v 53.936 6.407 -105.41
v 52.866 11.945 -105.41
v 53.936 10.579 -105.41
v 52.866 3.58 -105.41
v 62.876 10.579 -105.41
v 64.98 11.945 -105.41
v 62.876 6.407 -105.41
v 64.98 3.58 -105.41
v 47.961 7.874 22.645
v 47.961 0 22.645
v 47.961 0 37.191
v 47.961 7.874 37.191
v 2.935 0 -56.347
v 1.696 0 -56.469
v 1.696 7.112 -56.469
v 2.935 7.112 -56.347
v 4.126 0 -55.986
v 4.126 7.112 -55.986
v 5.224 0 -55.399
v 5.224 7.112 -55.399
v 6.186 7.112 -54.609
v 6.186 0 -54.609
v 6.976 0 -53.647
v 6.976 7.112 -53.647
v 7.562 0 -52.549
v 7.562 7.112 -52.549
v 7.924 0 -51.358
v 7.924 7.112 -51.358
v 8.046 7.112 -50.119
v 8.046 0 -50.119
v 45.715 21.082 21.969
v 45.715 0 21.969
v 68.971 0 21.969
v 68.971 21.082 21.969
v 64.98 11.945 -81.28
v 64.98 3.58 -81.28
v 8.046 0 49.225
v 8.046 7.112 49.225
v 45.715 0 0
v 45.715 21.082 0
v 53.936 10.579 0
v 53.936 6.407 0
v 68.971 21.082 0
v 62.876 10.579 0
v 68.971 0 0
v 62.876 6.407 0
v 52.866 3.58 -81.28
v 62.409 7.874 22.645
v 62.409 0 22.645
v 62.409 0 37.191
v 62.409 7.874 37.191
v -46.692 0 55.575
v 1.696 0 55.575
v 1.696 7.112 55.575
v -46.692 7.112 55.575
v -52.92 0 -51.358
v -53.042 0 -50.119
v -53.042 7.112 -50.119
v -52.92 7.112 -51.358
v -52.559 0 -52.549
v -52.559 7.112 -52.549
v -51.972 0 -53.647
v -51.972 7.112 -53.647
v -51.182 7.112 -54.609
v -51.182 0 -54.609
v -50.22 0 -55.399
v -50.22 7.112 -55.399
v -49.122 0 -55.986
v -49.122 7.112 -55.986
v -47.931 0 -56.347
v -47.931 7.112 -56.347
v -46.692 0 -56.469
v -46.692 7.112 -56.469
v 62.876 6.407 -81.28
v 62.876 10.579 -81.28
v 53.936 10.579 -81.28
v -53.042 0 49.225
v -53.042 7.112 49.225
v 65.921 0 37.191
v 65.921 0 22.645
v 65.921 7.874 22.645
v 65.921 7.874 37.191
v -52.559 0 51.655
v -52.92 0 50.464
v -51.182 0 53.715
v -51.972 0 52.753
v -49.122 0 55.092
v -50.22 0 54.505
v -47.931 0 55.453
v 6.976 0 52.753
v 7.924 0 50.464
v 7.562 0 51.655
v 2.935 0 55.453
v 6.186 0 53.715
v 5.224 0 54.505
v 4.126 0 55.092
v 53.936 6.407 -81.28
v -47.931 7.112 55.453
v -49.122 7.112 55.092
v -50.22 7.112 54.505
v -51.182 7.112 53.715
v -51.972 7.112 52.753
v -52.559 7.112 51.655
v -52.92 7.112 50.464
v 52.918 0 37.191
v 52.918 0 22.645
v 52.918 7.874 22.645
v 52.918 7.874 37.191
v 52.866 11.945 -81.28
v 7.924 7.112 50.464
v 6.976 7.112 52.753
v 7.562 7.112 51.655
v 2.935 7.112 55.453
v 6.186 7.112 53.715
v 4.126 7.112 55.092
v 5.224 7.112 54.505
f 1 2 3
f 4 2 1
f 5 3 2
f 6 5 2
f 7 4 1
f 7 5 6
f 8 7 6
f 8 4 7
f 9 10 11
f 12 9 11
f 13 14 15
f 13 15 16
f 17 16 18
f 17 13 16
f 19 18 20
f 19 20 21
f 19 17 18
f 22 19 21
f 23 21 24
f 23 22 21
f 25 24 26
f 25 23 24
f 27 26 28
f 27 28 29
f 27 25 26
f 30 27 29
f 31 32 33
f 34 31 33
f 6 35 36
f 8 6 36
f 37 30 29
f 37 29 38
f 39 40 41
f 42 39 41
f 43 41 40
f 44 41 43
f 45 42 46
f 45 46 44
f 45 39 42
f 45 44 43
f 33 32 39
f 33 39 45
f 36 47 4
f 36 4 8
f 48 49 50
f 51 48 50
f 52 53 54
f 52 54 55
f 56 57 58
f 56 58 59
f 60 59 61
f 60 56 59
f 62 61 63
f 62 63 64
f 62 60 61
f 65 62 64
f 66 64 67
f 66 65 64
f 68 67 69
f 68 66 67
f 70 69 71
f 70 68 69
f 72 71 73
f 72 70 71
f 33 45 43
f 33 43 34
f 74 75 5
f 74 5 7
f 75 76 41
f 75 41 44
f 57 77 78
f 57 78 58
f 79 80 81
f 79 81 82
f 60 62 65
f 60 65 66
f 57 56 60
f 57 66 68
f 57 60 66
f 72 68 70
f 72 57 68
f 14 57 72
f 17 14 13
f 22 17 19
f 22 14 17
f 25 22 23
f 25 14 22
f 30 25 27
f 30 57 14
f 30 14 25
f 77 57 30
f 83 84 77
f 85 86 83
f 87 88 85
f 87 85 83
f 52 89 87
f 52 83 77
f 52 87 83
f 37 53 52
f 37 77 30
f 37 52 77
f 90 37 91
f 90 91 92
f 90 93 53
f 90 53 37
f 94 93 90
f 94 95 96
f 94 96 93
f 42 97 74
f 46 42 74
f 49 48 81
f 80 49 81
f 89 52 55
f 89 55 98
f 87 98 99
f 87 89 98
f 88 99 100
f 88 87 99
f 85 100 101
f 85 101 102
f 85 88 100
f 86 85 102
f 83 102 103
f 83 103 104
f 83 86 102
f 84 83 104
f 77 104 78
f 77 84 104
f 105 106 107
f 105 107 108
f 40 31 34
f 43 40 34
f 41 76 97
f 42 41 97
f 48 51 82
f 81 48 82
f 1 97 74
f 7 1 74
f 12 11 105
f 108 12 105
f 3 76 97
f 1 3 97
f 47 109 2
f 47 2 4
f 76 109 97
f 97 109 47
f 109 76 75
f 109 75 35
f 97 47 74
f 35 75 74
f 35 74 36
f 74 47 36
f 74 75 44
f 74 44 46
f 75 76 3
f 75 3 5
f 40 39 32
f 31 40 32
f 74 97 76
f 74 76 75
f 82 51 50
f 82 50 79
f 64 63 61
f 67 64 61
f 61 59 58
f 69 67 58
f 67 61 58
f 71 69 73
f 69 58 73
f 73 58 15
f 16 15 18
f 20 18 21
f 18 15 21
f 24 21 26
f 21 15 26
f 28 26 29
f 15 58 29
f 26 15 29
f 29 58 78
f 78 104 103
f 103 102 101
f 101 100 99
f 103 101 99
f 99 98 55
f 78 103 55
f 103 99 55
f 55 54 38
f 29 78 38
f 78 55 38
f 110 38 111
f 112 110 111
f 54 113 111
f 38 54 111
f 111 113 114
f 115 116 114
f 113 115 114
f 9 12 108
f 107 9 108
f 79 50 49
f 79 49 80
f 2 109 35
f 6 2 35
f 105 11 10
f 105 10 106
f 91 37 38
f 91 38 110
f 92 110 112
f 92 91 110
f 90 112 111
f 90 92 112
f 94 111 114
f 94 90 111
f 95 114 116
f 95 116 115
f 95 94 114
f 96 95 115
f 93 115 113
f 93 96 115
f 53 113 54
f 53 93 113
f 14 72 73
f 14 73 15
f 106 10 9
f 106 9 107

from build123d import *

# Parameters (mm, degrees)
F1_DEPTH  = 7.112
F4_W      = 23.2562273741
F4_H      = 21.9687595963
F5_DEPTH  = 21.082
F7_W      = 4.9568153918
F7_H      = 14.5456399769
F8_DEPTH  = 7.874
F7_W_2    = 3.5126581788
F9_W      = 8.9396610856
F9_H      = 4.1718445718
F10_DEPTH = 81.28
F12_W     = 12.1138878167
F12_H     = 8.3642441314
F12_W_2   = 8.9396610856
F12_H_2   = 4.1718445718
F13_DEPTH = 24.13


with BuildPart() as f1:
    # F0 (on Front) → F1 (new body)
    with BuildSketch(Plane.XZ):
        with BuildLine():
            ThreePointArc((-46.6920131981, 55.5749163032), (-51.1821412587, 53.7150443637), (-53.0420131981, 49.2249163032))
            Line((-53.0420131981, 49.2249163032), (-53.0420131981, -50.118885392))
            ThreePointArc((-53.0420131981, -50.118885392), (-51.1821412587, -54.6090134525), (-46.6920131981, -56.468885392))
            Line((-46.6920131981, -56.468885392), (1.6956985161, -56.468885392))
            ThreePointArc((1.6956985161, -56.468885392), (6.1858265766, -54.6090134525), (8.0456985161, -50.118885392))
            Line((8.0456985161, -50.118885392), (8.0456985161, 49.2249163032))
            ThreePointArc((8.0456985161, 49.2249163032), (6.1858265766, 53.7150443637), (1.6956985161, 55.5749163032))
            Line((1.6956985161, 55.5749163032), (-46.6920131981, 55.5749163032))
        make_face()
        with BuildLine():
            ThreePointArc((-50.0621236861, 39.0932964325), (-48.2022517466, 43.583424493), (-43.7121236861, 45.4432964325))
            Line((-43.7121236861, 45.4432964325), (-2.476143029, 45.4432964325))
            ThreePointArc((-2.476143029, 45.4432964325), (2.0139850316, 43.583424493), (3.873856971, 39.0932964325))
            Line((3.873856971, 39.0932964325), (3.873856971, -39.9872655213))
            ThreePointArc((3.873856971, -39.9872655213), (2.0139850316, -44.4773935818), (-2.476143029, -46.3372655213))
            Line((-2.476143029, -46.3372655213), (-43.7121236861, -46.3372655213))
            ThreePointArc((-43.7121236861, -46.3372655213), (-48.2022517466, -44.4773935818), (-50.0621236861, -39.9872655213))
            Line((-50.0621236861, -39.9872655213), (-50.0621236861, 39.0932964325))
        make_face(mode=Mode.SUBTRACT)
        with BuildLine():
            Line((-2.476143029, 45.4432964325), (-43.7121236861, 45.4432964325))
            ThreePointArc((-43.7121236861, 45.4432964325), (-48.2022517466, 43.583424493), (-50.0621236861, 39.0932964325))
            Line((-50.0621236861, 39.0932964325), (-50.0621236861, -39.9872655213))
            ThreePointArc((-50.0621236861, -39.9872655213), (-48.2022517466, -44.4773935818), (-43.7121236861, -46.3372655213))
            Line((-43.7121236861, -46.3372655213), (-2.476143029, -46.3372655213))
            ThreePointArc((-2.476143029, -46.3372655213), (2.0139850316, -44.4773935818), (3.873856971, -39.9872655213))
            Line((3.873856971, -39.9872655213), (3.873856971, 39.0932964325))
            ThreePointArc((3.873856971, 39.0932964325), (2.0139850316, 43.583424493), (-2.476143029, 45.4432964325))
        make_face()
    extrude(amount=-F1_DEPTH)


with BuildPart() as f5:
    # F4 (on Front) → F5 (new body)
    with BuildSketch(Plane.XZ):
        with Locations((57.3428422213, 10.9843797982)):
            Rectangle(F4_W, F4_H)
    extrude(amount=-F5_DEPTH)

    # F9 (on face) → F10 (join)
    with BuildSketch(Plane(origin=(0, 0, 0), x_dir=(1, 0, 0), z_dir=(0, 0, -1))):
        with Locations((58.4058053792, -8.4926821291)):
            Rectangle(F9_W, F9_H)
    extrude(amount=F10_DEPTH)


with BuildPart() as f8:
    # F7 (on Front) → F8 (new body)
    with BuildSketch(Plane.XZ):
        with Locations((50.4393633455, 29.9179041758)):
            Rectangle(F7_W, F7_H)
    extrude(amount=-F8_DEPTH)


with BuildPart() as f8b:
    # F7 (on Front) → F8, piece 2 (new body)
    with BuildSketch(Plane.XZ):
        with Locations((64.1649775207, 29.9179041758)):
            Rectangle(F7_W_2, F7_H)
    extrude(amount=-F8_DEPTH)


with BuildPart() as f13:
    # F12 (on face) → F13 (new body)
    with BuildSketch(Plane(origin=(0, 0, -81.28), x_dir=(1, 0, 0), z_dir=(0, 0, -1))):
        with Locations((58.9228775352, -7.7624699334)):
            Rectangle(F12_W, F12_H)
        with Locations((58.4058053792, -8.4926821291)):
            Rectangle(F12_W_2, F12_H_2, mode=Mode.SUBTRACT)
    extrude(amount=F13_DEPTH)


solid = Compound([f1.part, f5.part, f8.part, f8b.part, f13.part])
